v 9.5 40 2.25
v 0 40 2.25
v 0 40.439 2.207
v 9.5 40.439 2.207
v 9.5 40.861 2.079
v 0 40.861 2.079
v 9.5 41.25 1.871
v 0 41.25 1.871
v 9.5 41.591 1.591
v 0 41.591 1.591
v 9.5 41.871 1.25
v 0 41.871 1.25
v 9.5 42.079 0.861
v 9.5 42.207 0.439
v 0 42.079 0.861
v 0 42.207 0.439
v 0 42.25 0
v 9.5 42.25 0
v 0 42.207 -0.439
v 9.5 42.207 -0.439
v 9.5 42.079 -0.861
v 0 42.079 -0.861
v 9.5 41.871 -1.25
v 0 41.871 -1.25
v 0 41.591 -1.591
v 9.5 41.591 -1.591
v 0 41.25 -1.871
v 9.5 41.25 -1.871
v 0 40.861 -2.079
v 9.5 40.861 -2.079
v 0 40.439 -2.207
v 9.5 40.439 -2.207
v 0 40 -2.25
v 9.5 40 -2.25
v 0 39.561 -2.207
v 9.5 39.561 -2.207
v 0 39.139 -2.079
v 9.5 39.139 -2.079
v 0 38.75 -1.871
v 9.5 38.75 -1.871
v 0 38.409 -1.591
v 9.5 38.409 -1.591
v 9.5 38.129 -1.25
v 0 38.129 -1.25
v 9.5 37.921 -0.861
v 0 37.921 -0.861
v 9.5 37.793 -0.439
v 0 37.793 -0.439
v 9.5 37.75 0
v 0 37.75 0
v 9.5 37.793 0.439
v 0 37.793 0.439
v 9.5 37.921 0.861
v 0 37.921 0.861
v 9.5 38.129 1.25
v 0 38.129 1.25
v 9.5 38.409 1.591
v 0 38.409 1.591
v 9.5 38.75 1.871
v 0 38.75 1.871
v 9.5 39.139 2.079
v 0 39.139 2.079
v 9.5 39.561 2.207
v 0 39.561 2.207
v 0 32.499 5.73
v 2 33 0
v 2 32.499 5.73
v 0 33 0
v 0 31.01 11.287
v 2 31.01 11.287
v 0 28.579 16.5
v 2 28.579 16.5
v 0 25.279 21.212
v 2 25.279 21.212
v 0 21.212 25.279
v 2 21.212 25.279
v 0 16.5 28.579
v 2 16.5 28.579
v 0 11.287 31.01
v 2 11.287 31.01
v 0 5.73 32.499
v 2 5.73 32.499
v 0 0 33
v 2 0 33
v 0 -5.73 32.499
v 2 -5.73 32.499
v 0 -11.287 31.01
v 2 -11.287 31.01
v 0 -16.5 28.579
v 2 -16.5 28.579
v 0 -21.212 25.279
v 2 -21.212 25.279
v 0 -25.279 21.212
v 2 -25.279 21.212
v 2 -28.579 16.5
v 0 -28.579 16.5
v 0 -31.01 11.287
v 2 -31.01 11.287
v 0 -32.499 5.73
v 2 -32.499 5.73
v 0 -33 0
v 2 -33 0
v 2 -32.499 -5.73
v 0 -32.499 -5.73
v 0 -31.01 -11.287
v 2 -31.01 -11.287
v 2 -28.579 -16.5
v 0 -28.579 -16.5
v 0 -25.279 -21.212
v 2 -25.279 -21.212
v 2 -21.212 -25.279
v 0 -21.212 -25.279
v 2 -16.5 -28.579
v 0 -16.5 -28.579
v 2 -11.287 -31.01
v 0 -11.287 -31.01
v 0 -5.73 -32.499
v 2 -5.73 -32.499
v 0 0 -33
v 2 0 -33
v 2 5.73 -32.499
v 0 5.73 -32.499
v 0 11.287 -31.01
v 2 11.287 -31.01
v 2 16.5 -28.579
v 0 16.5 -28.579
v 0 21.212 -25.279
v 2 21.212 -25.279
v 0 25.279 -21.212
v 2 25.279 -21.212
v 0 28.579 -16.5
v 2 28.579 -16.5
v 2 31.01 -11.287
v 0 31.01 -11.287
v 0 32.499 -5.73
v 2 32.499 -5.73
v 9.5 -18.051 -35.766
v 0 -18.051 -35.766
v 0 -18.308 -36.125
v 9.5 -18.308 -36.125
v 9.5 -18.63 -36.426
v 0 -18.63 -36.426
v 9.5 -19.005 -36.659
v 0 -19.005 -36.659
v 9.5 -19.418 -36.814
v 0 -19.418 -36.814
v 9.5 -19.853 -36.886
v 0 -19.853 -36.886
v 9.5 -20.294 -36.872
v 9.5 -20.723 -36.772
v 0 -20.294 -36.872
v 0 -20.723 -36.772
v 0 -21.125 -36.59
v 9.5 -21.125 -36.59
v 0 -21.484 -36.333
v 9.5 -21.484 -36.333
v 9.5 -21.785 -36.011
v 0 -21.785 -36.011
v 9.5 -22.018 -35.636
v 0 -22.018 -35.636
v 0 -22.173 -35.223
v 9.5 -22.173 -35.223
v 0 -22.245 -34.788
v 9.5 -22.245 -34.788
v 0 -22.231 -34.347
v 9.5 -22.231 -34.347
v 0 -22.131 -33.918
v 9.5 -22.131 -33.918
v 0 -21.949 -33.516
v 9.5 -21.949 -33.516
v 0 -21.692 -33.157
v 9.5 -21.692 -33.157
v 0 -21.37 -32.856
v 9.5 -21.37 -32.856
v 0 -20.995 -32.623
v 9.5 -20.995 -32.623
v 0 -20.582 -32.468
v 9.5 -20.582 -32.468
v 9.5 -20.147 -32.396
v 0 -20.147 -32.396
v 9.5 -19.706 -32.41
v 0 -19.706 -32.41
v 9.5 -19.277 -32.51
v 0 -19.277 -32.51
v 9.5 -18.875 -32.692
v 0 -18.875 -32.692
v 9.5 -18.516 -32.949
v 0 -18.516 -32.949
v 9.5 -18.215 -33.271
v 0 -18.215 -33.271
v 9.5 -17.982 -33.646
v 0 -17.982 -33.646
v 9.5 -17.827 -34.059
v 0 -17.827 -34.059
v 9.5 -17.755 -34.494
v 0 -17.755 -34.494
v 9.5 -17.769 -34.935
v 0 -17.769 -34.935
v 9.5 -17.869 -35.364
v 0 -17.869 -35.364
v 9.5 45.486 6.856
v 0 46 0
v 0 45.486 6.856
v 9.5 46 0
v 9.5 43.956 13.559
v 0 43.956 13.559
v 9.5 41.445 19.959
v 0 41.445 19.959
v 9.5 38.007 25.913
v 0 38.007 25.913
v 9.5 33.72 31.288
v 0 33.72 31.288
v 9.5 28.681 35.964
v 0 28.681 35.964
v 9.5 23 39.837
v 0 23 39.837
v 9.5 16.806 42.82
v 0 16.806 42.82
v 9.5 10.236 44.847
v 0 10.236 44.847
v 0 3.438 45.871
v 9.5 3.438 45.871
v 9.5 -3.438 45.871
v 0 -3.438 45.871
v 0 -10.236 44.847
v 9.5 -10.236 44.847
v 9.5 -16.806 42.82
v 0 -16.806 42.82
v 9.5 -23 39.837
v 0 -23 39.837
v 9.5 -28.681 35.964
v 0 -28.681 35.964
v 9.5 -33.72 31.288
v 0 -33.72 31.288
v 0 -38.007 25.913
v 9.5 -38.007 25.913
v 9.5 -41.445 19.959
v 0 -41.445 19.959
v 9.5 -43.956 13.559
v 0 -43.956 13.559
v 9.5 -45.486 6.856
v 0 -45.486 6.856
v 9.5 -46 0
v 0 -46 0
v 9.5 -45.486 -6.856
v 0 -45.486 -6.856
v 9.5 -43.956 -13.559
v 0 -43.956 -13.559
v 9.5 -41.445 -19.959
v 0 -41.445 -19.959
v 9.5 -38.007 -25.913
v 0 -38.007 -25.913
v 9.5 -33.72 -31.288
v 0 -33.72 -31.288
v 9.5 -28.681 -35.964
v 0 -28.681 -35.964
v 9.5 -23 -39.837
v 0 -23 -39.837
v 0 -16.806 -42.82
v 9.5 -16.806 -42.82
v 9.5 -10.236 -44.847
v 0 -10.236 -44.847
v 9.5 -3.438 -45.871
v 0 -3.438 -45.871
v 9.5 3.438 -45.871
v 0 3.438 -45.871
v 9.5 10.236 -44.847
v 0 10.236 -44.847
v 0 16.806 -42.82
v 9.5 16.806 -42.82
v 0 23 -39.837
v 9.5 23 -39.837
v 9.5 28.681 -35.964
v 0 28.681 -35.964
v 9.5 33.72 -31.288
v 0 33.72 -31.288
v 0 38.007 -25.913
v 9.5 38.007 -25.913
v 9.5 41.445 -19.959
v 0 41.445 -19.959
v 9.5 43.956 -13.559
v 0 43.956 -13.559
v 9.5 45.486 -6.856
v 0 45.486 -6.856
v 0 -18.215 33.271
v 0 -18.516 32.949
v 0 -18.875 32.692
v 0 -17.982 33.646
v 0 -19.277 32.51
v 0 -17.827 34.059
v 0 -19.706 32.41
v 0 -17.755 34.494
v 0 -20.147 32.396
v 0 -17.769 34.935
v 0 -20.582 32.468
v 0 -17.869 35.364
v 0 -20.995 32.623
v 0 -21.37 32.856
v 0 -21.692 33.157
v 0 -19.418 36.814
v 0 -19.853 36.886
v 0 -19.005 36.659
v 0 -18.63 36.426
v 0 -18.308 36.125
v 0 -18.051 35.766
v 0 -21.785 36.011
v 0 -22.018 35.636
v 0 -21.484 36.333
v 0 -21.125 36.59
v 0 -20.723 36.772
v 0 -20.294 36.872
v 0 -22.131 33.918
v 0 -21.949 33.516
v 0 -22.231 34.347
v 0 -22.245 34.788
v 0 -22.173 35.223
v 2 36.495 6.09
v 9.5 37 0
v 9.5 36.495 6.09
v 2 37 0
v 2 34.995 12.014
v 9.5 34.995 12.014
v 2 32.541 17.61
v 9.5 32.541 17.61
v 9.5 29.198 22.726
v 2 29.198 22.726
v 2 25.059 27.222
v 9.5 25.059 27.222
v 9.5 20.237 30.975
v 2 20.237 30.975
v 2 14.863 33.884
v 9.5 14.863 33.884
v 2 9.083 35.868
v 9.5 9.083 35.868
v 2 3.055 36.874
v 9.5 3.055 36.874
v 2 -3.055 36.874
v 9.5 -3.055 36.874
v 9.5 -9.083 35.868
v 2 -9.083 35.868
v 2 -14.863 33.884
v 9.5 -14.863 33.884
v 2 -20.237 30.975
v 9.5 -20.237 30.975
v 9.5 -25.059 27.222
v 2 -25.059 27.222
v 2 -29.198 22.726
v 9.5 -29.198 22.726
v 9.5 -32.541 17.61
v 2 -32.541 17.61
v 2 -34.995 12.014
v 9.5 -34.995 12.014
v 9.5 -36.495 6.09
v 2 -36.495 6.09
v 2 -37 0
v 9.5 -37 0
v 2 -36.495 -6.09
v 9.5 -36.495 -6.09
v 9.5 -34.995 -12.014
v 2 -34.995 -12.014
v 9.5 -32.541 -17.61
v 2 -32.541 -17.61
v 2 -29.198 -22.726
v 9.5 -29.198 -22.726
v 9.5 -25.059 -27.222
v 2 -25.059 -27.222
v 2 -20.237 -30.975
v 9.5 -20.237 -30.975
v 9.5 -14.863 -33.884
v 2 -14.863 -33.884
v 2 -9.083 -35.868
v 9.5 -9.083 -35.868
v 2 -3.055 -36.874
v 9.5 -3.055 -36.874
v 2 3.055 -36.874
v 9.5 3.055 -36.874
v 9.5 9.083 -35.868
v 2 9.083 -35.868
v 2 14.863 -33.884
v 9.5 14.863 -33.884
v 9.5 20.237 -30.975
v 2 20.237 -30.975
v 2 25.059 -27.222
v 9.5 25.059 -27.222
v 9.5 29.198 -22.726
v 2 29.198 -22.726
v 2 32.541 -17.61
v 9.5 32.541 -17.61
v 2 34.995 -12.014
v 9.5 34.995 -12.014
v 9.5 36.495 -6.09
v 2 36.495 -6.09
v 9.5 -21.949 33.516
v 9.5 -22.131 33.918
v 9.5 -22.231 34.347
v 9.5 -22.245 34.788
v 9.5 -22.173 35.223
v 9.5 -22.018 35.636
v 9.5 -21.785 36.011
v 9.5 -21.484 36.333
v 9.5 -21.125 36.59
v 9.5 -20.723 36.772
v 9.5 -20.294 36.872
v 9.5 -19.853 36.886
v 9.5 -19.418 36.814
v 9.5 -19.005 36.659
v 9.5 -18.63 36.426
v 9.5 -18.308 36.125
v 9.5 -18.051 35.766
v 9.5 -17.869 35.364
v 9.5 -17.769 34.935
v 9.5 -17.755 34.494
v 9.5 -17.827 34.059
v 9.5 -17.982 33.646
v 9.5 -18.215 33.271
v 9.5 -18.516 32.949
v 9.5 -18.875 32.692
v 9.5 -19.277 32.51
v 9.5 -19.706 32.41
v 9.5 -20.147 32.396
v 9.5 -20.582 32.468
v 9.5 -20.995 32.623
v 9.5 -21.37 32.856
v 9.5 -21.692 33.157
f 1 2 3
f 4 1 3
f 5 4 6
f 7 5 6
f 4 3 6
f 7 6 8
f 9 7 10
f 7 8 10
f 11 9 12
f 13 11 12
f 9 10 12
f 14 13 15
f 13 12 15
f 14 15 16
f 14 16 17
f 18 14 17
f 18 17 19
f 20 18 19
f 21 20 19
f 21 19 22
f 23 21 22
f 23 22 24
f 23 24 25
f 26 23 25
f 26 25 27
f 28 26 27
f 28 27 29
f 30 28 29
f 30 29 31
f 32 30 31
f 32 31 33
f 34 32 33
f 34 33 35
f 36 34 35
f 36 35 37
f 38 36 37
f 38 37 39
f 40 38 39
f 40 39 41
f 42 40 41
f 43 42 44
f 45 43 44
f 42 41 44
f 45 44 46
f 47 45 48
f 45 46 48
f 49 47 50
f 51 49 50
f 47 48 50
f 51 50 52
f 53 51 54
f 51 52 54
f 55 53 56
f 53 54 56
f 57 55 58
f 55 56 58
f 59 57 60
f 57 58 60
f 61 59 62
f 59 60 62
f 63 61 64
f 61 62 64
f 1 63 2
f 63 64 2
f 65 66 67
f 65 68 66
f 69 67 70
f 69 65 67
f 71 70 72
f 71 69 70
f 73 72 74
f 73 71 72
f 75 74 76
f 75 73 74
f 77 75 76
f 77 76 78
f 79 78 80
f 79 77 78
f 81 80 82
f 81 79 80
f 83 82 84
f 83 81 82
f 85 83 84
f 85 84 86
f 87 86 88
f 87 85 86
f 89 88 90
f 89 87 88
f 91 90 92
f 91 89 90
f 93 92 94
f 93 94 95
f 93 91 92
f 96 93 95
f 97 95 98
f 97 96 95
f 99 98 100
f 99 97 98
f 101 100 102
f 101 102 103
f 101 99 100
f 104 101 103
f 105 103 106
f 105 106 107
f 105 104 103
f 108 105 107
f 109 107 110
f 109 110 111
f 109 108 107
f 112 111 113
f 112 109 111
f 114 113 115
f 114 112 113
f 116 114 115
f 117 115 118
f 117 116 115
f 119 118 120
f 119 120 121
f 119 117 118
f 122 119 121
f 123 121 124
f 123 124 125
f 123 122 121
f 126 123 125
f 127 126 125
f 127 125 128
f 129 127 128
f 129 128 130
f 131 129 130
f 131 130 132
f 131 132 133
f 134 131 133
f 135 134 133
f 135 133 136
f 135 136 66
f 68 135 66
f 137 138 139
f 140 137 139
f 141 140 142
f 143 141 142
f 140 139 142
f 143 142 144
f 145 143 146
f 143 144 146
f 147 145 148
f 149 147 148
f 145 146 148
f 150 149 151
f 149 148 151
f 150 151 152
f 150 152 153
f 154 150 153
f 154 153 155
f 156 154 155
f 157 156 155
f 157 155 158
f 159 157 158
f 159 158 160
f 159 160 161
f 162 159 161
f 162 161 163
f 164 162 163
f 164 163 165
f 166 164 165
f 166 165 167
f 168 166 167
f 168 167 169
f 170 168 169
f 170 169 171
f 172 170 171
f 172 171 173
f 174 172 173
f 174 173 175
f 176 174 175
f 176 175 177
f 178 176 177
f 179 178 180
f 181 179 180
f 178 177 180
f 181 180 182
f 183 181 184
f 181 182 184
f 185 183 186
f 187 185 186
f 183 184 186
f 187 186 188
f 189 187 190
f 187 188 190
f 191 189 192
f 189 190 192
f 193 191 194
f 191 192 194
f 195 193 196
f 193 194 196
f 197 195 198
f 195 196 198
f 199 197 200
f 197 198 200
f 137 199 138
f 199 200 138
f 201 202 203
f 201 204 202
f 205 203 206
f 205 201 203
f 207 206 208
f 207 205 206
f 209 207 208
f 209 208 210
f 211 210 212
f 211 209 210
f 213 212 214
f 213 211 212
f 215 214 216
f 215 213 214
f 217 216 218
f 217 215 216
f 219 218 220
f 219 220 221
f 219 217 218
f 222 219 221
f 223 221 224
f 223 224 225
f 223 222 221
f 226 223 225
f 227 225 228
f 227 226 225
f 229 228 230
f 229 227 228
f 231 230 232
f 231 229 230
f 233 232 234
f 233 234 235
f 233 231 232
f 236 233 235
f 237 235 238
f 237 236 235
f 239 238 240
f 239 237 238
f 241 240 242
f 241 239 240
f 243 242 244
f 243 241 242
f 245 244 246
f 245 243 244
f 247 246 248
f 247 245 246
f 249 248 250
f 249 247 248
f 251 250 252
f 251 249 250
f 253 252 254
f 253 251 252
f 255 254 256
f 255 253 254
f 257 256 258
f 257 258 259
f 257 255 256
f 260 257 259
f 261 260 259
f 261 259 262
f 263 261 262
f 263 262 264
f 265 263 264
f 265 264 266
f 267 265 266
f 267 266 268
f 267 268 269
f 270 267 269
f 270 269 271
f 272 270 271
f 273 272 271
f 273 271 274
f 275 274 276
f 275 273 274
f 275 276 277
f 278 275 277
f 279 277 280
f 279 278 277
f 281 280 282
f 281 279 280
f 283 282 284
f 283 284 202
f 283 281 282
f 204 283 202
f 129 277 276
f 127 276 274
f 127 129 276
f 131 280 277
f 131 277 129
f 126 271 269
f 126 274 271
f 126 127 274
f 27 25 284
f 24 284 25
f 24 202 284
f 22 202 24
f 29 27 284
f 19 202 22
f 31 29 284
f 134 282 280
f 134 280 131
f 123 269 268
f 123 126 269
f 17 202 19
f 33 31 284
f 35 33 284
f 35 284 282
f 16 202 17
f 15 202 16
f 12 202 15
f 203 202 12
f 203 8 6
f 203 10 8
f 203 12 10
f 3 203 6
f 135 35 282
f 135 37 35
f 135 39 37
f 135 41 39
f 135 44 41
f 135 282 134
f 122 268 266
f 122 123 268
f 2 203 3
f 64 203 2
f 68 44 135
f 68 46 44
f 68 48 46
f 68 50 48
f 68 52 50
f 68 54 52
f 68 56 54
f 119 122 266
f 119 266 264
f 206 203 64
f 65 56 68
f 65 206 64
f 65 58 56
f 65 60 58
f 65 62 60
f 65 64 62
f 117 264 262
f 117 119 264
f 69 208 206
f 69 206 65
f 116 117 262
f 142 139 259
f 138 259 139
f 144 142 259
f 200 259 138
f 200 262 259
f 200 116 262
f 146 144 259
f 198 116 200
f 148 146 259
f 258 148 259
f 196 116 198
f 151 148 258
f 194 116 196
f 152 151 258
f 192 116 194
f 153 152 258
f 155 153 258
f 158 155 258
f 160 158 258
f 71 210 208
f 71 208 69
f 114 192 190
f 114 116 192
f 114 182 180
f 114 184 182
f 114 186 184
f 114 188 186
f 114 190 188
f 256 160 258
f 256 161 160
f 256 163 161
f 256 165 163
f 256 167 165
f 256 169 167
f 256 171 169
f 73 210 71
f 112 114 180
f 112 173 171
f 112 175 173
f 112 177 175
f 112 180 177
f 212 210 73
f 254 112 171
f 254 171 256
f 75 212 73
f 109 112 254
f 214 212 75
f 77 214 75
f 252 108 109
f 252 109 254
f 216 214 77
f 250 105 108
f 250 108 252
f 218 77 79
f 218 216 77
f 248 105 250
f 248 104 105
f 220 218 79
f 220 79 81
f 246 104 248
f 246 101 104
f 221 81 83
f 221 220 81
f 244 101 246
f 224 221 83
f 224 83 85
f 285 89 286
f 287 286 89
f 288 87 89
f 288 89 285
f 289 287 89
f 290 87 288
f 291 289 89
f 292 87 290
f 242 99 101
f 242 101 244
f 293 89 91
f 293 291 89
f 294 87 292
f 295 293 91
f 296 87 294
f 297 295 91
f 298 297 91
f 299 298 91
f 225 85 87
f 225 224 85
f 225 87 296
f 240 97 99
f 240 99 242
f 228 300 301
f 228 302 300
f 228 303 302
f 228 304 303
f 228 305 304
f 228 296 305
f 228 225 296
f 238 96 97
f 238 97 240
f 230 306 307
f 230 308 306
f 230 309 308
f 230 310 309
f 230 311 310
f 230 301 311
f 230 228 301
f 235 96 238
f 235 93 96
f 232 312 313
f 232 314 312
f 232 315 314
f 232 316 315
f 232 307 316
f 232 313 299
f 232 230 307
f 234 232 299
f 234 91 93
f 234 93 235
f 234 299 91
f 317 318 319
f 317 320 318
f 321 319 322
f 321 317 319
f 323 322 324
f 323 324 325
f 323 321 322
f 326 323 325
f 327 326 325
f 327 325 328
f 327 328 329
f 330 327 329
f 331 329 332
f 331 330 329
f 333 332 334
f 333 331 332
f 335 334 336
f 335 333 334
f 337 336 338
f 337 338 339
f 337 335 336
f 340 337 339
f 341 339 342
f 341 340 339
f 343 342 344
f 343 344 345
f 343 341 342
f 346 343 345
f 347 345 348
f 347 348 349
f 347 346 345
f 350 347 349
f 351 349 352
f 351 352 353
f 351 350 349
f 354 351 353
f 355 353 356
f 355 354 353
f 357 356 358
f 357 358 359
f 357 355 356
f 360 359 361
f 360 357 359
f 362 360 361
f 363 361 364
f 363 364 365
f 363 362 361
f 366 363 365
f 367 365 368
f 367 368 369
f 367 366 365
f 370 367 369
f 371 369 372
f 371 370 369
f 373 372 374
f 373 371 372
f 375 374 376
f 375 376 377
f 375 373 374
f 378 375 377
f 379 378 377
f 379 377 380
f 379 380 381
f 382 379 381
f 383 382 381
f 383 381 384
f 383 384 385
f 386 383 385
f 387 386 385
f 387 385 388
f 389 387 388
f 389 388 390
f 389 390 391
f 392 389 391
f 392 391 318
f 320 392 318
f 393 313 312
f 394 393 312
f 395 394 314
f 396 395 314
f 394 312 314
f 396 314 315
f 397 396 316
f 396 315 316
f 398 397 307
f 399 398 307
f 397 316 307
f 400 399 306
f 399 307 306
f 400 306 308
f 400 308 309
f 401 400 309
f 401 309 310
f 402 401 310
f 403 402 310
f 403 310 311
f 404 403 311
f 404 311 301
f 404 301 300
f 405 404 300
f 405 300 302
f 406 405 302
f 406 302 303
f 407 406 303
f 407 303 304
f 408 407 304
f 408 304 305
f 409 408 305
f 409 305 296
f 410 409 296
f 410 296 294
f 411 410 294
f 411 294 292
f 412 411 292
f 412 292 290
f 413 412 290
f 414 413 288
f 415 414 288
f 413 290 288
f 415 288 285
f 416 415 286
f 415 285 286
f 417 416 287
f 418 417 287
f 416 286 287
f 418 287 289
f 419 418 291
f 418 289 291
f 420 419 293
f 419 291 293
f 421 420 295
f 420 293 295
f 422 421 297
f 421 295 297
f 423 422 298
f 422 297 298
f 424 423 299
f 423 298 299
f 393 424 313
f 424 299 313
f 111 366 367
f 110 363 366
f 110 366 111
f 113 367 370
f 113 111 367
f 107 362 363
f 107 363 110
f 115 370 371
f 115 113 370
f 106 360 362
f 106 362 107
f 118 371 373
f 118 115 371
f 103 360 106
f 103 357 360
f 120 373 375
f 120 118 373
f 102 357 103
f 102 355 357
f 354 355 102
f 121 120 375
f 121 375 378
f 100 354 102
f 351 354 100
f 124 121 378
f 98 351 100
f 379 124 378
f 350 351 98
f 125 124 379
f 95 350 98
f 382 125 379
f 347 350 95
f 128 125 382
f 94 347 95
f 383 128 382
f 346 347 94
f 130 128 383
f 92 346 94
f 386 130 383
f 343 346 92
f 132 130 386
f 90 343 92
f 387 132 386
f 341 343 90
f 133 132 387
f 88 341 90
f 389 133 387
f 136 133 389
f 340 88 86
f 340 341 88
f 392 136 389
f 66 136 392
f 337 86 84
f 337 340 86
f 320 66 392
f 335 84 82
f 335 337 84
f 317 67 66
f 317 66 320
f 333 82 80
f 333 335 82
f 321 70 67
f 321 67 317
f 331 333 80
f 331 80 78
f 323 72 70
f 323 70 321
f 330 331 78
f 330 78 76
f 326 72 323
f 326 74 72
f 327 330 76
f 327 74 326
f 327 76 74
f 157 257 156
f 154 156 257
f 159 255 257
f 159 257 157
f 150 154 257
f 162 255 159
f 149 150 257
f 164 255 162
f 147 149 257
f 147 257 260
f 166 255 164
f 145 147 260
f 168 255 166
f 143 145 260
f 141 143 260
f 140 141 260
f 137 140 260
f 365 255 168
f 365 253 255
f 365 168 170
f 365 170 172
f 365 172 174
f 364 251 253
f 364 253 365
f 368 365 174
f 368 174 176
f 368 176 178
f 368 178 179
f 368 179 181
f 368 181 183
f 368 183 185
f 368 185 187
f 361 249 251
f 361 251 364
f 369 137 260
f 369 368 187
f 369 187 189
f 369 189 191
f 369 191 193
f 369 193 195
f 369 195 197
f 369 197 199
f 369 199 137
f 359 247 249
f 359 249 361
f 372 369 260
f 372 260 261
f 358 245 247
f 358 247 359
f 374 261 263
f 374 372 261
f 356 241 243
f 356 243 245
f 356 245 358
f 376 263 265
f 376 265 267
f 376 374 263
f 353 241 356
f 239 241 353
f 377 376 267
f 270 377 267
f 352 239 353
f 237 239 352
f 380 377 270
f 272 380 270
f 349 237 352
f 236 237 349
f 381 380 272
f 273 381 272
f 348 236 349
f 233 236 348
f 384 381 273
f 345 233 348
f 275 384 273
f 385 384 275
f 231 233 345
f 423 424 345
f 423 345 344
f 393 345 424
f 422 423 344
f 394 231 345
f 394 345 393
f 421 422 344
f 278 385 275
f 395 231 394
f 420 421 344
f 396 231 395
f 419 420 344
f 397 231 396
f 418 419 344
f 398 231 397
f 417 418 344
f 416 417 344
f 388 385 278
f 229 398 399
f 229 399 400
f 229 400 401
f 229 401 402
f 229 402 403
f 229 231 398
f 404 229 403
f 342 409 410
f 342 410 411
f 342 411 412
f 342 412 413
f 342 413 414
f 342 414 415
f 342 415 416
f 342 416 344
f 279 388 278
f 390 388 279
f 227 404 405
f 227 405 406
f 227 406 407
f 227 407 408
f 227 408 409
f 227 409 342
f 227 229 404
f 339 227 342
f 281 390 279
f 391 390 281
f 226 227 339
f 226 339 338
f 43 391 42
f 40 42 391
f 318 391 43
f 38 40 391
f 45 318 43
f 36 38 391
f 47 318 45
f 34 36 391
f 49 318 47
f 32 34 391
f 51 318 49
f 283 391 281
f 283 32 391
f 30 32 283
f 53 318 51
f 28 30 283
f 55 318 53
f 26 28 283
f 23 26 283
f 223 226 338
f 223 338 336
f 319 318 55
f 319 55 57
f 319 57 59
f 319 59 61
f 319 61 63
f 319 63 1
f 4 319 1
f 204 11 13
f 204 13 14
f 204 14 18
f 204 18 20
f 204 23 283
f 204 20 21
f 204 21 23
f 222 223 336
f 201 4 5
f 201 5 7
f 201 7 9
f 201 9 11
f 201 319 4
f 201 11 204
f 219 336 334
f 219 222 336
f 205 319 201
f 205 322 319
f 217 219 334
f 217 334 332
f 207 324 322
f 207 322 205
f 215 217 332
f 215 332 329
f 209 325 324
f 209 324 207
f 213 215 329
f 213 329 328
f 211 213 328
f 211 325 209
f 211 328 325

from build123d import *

# Parameters (mm, degrees)
ESQUISSE2_R                  = 2.25
ENL_V_MAT_EXTRU_1_DEPTH      = 10.5
R_P_TITION_CIRCULAIRE1_COUNT = 3


with BuildPart() as part:
    # Esquisse1 → Base-Révolution (revolve)
    with BuildSketch(Plane.XY):
        Polygon((0, 33), (0, 46), (9.5, 46), (9.5, 37), (2, 37), (2, 33), align=None)
    revolve(axis=Axis((0, 0, 0), (1, 0, 0)))

    # Esquisse2 → Enlèv. mat.-Extru.1 (cut, through all)
    with BuildSketch(Plane.ZY):
        with Locations((0, 40)):
            Circle(ESQUISSE2_R)
    enl_v_mat_extru_1 = extrude(amount=-ENL_V_MAT_EXTRU_1_DEPTH, mode=Mode.SUBTRACT)

    # Répétition circulaire1: Enlèv. mat.-Extru.1 ×3 about axis
    r_p_tition_circulaire1_axis = Axis((0, 0, 0), (1, 0, 0))
    for i in range(1, R_P_TITION_CIRCULAIRE1_COUNT):
        add(enl_v_mat_extru_1.rotate(r_p_tition_circulaire1_axis, i * 360 / R_P_TITION_CIRCULAIRE1_COUNT), mode=Mode.SUBTRACT)


solid = part.part
